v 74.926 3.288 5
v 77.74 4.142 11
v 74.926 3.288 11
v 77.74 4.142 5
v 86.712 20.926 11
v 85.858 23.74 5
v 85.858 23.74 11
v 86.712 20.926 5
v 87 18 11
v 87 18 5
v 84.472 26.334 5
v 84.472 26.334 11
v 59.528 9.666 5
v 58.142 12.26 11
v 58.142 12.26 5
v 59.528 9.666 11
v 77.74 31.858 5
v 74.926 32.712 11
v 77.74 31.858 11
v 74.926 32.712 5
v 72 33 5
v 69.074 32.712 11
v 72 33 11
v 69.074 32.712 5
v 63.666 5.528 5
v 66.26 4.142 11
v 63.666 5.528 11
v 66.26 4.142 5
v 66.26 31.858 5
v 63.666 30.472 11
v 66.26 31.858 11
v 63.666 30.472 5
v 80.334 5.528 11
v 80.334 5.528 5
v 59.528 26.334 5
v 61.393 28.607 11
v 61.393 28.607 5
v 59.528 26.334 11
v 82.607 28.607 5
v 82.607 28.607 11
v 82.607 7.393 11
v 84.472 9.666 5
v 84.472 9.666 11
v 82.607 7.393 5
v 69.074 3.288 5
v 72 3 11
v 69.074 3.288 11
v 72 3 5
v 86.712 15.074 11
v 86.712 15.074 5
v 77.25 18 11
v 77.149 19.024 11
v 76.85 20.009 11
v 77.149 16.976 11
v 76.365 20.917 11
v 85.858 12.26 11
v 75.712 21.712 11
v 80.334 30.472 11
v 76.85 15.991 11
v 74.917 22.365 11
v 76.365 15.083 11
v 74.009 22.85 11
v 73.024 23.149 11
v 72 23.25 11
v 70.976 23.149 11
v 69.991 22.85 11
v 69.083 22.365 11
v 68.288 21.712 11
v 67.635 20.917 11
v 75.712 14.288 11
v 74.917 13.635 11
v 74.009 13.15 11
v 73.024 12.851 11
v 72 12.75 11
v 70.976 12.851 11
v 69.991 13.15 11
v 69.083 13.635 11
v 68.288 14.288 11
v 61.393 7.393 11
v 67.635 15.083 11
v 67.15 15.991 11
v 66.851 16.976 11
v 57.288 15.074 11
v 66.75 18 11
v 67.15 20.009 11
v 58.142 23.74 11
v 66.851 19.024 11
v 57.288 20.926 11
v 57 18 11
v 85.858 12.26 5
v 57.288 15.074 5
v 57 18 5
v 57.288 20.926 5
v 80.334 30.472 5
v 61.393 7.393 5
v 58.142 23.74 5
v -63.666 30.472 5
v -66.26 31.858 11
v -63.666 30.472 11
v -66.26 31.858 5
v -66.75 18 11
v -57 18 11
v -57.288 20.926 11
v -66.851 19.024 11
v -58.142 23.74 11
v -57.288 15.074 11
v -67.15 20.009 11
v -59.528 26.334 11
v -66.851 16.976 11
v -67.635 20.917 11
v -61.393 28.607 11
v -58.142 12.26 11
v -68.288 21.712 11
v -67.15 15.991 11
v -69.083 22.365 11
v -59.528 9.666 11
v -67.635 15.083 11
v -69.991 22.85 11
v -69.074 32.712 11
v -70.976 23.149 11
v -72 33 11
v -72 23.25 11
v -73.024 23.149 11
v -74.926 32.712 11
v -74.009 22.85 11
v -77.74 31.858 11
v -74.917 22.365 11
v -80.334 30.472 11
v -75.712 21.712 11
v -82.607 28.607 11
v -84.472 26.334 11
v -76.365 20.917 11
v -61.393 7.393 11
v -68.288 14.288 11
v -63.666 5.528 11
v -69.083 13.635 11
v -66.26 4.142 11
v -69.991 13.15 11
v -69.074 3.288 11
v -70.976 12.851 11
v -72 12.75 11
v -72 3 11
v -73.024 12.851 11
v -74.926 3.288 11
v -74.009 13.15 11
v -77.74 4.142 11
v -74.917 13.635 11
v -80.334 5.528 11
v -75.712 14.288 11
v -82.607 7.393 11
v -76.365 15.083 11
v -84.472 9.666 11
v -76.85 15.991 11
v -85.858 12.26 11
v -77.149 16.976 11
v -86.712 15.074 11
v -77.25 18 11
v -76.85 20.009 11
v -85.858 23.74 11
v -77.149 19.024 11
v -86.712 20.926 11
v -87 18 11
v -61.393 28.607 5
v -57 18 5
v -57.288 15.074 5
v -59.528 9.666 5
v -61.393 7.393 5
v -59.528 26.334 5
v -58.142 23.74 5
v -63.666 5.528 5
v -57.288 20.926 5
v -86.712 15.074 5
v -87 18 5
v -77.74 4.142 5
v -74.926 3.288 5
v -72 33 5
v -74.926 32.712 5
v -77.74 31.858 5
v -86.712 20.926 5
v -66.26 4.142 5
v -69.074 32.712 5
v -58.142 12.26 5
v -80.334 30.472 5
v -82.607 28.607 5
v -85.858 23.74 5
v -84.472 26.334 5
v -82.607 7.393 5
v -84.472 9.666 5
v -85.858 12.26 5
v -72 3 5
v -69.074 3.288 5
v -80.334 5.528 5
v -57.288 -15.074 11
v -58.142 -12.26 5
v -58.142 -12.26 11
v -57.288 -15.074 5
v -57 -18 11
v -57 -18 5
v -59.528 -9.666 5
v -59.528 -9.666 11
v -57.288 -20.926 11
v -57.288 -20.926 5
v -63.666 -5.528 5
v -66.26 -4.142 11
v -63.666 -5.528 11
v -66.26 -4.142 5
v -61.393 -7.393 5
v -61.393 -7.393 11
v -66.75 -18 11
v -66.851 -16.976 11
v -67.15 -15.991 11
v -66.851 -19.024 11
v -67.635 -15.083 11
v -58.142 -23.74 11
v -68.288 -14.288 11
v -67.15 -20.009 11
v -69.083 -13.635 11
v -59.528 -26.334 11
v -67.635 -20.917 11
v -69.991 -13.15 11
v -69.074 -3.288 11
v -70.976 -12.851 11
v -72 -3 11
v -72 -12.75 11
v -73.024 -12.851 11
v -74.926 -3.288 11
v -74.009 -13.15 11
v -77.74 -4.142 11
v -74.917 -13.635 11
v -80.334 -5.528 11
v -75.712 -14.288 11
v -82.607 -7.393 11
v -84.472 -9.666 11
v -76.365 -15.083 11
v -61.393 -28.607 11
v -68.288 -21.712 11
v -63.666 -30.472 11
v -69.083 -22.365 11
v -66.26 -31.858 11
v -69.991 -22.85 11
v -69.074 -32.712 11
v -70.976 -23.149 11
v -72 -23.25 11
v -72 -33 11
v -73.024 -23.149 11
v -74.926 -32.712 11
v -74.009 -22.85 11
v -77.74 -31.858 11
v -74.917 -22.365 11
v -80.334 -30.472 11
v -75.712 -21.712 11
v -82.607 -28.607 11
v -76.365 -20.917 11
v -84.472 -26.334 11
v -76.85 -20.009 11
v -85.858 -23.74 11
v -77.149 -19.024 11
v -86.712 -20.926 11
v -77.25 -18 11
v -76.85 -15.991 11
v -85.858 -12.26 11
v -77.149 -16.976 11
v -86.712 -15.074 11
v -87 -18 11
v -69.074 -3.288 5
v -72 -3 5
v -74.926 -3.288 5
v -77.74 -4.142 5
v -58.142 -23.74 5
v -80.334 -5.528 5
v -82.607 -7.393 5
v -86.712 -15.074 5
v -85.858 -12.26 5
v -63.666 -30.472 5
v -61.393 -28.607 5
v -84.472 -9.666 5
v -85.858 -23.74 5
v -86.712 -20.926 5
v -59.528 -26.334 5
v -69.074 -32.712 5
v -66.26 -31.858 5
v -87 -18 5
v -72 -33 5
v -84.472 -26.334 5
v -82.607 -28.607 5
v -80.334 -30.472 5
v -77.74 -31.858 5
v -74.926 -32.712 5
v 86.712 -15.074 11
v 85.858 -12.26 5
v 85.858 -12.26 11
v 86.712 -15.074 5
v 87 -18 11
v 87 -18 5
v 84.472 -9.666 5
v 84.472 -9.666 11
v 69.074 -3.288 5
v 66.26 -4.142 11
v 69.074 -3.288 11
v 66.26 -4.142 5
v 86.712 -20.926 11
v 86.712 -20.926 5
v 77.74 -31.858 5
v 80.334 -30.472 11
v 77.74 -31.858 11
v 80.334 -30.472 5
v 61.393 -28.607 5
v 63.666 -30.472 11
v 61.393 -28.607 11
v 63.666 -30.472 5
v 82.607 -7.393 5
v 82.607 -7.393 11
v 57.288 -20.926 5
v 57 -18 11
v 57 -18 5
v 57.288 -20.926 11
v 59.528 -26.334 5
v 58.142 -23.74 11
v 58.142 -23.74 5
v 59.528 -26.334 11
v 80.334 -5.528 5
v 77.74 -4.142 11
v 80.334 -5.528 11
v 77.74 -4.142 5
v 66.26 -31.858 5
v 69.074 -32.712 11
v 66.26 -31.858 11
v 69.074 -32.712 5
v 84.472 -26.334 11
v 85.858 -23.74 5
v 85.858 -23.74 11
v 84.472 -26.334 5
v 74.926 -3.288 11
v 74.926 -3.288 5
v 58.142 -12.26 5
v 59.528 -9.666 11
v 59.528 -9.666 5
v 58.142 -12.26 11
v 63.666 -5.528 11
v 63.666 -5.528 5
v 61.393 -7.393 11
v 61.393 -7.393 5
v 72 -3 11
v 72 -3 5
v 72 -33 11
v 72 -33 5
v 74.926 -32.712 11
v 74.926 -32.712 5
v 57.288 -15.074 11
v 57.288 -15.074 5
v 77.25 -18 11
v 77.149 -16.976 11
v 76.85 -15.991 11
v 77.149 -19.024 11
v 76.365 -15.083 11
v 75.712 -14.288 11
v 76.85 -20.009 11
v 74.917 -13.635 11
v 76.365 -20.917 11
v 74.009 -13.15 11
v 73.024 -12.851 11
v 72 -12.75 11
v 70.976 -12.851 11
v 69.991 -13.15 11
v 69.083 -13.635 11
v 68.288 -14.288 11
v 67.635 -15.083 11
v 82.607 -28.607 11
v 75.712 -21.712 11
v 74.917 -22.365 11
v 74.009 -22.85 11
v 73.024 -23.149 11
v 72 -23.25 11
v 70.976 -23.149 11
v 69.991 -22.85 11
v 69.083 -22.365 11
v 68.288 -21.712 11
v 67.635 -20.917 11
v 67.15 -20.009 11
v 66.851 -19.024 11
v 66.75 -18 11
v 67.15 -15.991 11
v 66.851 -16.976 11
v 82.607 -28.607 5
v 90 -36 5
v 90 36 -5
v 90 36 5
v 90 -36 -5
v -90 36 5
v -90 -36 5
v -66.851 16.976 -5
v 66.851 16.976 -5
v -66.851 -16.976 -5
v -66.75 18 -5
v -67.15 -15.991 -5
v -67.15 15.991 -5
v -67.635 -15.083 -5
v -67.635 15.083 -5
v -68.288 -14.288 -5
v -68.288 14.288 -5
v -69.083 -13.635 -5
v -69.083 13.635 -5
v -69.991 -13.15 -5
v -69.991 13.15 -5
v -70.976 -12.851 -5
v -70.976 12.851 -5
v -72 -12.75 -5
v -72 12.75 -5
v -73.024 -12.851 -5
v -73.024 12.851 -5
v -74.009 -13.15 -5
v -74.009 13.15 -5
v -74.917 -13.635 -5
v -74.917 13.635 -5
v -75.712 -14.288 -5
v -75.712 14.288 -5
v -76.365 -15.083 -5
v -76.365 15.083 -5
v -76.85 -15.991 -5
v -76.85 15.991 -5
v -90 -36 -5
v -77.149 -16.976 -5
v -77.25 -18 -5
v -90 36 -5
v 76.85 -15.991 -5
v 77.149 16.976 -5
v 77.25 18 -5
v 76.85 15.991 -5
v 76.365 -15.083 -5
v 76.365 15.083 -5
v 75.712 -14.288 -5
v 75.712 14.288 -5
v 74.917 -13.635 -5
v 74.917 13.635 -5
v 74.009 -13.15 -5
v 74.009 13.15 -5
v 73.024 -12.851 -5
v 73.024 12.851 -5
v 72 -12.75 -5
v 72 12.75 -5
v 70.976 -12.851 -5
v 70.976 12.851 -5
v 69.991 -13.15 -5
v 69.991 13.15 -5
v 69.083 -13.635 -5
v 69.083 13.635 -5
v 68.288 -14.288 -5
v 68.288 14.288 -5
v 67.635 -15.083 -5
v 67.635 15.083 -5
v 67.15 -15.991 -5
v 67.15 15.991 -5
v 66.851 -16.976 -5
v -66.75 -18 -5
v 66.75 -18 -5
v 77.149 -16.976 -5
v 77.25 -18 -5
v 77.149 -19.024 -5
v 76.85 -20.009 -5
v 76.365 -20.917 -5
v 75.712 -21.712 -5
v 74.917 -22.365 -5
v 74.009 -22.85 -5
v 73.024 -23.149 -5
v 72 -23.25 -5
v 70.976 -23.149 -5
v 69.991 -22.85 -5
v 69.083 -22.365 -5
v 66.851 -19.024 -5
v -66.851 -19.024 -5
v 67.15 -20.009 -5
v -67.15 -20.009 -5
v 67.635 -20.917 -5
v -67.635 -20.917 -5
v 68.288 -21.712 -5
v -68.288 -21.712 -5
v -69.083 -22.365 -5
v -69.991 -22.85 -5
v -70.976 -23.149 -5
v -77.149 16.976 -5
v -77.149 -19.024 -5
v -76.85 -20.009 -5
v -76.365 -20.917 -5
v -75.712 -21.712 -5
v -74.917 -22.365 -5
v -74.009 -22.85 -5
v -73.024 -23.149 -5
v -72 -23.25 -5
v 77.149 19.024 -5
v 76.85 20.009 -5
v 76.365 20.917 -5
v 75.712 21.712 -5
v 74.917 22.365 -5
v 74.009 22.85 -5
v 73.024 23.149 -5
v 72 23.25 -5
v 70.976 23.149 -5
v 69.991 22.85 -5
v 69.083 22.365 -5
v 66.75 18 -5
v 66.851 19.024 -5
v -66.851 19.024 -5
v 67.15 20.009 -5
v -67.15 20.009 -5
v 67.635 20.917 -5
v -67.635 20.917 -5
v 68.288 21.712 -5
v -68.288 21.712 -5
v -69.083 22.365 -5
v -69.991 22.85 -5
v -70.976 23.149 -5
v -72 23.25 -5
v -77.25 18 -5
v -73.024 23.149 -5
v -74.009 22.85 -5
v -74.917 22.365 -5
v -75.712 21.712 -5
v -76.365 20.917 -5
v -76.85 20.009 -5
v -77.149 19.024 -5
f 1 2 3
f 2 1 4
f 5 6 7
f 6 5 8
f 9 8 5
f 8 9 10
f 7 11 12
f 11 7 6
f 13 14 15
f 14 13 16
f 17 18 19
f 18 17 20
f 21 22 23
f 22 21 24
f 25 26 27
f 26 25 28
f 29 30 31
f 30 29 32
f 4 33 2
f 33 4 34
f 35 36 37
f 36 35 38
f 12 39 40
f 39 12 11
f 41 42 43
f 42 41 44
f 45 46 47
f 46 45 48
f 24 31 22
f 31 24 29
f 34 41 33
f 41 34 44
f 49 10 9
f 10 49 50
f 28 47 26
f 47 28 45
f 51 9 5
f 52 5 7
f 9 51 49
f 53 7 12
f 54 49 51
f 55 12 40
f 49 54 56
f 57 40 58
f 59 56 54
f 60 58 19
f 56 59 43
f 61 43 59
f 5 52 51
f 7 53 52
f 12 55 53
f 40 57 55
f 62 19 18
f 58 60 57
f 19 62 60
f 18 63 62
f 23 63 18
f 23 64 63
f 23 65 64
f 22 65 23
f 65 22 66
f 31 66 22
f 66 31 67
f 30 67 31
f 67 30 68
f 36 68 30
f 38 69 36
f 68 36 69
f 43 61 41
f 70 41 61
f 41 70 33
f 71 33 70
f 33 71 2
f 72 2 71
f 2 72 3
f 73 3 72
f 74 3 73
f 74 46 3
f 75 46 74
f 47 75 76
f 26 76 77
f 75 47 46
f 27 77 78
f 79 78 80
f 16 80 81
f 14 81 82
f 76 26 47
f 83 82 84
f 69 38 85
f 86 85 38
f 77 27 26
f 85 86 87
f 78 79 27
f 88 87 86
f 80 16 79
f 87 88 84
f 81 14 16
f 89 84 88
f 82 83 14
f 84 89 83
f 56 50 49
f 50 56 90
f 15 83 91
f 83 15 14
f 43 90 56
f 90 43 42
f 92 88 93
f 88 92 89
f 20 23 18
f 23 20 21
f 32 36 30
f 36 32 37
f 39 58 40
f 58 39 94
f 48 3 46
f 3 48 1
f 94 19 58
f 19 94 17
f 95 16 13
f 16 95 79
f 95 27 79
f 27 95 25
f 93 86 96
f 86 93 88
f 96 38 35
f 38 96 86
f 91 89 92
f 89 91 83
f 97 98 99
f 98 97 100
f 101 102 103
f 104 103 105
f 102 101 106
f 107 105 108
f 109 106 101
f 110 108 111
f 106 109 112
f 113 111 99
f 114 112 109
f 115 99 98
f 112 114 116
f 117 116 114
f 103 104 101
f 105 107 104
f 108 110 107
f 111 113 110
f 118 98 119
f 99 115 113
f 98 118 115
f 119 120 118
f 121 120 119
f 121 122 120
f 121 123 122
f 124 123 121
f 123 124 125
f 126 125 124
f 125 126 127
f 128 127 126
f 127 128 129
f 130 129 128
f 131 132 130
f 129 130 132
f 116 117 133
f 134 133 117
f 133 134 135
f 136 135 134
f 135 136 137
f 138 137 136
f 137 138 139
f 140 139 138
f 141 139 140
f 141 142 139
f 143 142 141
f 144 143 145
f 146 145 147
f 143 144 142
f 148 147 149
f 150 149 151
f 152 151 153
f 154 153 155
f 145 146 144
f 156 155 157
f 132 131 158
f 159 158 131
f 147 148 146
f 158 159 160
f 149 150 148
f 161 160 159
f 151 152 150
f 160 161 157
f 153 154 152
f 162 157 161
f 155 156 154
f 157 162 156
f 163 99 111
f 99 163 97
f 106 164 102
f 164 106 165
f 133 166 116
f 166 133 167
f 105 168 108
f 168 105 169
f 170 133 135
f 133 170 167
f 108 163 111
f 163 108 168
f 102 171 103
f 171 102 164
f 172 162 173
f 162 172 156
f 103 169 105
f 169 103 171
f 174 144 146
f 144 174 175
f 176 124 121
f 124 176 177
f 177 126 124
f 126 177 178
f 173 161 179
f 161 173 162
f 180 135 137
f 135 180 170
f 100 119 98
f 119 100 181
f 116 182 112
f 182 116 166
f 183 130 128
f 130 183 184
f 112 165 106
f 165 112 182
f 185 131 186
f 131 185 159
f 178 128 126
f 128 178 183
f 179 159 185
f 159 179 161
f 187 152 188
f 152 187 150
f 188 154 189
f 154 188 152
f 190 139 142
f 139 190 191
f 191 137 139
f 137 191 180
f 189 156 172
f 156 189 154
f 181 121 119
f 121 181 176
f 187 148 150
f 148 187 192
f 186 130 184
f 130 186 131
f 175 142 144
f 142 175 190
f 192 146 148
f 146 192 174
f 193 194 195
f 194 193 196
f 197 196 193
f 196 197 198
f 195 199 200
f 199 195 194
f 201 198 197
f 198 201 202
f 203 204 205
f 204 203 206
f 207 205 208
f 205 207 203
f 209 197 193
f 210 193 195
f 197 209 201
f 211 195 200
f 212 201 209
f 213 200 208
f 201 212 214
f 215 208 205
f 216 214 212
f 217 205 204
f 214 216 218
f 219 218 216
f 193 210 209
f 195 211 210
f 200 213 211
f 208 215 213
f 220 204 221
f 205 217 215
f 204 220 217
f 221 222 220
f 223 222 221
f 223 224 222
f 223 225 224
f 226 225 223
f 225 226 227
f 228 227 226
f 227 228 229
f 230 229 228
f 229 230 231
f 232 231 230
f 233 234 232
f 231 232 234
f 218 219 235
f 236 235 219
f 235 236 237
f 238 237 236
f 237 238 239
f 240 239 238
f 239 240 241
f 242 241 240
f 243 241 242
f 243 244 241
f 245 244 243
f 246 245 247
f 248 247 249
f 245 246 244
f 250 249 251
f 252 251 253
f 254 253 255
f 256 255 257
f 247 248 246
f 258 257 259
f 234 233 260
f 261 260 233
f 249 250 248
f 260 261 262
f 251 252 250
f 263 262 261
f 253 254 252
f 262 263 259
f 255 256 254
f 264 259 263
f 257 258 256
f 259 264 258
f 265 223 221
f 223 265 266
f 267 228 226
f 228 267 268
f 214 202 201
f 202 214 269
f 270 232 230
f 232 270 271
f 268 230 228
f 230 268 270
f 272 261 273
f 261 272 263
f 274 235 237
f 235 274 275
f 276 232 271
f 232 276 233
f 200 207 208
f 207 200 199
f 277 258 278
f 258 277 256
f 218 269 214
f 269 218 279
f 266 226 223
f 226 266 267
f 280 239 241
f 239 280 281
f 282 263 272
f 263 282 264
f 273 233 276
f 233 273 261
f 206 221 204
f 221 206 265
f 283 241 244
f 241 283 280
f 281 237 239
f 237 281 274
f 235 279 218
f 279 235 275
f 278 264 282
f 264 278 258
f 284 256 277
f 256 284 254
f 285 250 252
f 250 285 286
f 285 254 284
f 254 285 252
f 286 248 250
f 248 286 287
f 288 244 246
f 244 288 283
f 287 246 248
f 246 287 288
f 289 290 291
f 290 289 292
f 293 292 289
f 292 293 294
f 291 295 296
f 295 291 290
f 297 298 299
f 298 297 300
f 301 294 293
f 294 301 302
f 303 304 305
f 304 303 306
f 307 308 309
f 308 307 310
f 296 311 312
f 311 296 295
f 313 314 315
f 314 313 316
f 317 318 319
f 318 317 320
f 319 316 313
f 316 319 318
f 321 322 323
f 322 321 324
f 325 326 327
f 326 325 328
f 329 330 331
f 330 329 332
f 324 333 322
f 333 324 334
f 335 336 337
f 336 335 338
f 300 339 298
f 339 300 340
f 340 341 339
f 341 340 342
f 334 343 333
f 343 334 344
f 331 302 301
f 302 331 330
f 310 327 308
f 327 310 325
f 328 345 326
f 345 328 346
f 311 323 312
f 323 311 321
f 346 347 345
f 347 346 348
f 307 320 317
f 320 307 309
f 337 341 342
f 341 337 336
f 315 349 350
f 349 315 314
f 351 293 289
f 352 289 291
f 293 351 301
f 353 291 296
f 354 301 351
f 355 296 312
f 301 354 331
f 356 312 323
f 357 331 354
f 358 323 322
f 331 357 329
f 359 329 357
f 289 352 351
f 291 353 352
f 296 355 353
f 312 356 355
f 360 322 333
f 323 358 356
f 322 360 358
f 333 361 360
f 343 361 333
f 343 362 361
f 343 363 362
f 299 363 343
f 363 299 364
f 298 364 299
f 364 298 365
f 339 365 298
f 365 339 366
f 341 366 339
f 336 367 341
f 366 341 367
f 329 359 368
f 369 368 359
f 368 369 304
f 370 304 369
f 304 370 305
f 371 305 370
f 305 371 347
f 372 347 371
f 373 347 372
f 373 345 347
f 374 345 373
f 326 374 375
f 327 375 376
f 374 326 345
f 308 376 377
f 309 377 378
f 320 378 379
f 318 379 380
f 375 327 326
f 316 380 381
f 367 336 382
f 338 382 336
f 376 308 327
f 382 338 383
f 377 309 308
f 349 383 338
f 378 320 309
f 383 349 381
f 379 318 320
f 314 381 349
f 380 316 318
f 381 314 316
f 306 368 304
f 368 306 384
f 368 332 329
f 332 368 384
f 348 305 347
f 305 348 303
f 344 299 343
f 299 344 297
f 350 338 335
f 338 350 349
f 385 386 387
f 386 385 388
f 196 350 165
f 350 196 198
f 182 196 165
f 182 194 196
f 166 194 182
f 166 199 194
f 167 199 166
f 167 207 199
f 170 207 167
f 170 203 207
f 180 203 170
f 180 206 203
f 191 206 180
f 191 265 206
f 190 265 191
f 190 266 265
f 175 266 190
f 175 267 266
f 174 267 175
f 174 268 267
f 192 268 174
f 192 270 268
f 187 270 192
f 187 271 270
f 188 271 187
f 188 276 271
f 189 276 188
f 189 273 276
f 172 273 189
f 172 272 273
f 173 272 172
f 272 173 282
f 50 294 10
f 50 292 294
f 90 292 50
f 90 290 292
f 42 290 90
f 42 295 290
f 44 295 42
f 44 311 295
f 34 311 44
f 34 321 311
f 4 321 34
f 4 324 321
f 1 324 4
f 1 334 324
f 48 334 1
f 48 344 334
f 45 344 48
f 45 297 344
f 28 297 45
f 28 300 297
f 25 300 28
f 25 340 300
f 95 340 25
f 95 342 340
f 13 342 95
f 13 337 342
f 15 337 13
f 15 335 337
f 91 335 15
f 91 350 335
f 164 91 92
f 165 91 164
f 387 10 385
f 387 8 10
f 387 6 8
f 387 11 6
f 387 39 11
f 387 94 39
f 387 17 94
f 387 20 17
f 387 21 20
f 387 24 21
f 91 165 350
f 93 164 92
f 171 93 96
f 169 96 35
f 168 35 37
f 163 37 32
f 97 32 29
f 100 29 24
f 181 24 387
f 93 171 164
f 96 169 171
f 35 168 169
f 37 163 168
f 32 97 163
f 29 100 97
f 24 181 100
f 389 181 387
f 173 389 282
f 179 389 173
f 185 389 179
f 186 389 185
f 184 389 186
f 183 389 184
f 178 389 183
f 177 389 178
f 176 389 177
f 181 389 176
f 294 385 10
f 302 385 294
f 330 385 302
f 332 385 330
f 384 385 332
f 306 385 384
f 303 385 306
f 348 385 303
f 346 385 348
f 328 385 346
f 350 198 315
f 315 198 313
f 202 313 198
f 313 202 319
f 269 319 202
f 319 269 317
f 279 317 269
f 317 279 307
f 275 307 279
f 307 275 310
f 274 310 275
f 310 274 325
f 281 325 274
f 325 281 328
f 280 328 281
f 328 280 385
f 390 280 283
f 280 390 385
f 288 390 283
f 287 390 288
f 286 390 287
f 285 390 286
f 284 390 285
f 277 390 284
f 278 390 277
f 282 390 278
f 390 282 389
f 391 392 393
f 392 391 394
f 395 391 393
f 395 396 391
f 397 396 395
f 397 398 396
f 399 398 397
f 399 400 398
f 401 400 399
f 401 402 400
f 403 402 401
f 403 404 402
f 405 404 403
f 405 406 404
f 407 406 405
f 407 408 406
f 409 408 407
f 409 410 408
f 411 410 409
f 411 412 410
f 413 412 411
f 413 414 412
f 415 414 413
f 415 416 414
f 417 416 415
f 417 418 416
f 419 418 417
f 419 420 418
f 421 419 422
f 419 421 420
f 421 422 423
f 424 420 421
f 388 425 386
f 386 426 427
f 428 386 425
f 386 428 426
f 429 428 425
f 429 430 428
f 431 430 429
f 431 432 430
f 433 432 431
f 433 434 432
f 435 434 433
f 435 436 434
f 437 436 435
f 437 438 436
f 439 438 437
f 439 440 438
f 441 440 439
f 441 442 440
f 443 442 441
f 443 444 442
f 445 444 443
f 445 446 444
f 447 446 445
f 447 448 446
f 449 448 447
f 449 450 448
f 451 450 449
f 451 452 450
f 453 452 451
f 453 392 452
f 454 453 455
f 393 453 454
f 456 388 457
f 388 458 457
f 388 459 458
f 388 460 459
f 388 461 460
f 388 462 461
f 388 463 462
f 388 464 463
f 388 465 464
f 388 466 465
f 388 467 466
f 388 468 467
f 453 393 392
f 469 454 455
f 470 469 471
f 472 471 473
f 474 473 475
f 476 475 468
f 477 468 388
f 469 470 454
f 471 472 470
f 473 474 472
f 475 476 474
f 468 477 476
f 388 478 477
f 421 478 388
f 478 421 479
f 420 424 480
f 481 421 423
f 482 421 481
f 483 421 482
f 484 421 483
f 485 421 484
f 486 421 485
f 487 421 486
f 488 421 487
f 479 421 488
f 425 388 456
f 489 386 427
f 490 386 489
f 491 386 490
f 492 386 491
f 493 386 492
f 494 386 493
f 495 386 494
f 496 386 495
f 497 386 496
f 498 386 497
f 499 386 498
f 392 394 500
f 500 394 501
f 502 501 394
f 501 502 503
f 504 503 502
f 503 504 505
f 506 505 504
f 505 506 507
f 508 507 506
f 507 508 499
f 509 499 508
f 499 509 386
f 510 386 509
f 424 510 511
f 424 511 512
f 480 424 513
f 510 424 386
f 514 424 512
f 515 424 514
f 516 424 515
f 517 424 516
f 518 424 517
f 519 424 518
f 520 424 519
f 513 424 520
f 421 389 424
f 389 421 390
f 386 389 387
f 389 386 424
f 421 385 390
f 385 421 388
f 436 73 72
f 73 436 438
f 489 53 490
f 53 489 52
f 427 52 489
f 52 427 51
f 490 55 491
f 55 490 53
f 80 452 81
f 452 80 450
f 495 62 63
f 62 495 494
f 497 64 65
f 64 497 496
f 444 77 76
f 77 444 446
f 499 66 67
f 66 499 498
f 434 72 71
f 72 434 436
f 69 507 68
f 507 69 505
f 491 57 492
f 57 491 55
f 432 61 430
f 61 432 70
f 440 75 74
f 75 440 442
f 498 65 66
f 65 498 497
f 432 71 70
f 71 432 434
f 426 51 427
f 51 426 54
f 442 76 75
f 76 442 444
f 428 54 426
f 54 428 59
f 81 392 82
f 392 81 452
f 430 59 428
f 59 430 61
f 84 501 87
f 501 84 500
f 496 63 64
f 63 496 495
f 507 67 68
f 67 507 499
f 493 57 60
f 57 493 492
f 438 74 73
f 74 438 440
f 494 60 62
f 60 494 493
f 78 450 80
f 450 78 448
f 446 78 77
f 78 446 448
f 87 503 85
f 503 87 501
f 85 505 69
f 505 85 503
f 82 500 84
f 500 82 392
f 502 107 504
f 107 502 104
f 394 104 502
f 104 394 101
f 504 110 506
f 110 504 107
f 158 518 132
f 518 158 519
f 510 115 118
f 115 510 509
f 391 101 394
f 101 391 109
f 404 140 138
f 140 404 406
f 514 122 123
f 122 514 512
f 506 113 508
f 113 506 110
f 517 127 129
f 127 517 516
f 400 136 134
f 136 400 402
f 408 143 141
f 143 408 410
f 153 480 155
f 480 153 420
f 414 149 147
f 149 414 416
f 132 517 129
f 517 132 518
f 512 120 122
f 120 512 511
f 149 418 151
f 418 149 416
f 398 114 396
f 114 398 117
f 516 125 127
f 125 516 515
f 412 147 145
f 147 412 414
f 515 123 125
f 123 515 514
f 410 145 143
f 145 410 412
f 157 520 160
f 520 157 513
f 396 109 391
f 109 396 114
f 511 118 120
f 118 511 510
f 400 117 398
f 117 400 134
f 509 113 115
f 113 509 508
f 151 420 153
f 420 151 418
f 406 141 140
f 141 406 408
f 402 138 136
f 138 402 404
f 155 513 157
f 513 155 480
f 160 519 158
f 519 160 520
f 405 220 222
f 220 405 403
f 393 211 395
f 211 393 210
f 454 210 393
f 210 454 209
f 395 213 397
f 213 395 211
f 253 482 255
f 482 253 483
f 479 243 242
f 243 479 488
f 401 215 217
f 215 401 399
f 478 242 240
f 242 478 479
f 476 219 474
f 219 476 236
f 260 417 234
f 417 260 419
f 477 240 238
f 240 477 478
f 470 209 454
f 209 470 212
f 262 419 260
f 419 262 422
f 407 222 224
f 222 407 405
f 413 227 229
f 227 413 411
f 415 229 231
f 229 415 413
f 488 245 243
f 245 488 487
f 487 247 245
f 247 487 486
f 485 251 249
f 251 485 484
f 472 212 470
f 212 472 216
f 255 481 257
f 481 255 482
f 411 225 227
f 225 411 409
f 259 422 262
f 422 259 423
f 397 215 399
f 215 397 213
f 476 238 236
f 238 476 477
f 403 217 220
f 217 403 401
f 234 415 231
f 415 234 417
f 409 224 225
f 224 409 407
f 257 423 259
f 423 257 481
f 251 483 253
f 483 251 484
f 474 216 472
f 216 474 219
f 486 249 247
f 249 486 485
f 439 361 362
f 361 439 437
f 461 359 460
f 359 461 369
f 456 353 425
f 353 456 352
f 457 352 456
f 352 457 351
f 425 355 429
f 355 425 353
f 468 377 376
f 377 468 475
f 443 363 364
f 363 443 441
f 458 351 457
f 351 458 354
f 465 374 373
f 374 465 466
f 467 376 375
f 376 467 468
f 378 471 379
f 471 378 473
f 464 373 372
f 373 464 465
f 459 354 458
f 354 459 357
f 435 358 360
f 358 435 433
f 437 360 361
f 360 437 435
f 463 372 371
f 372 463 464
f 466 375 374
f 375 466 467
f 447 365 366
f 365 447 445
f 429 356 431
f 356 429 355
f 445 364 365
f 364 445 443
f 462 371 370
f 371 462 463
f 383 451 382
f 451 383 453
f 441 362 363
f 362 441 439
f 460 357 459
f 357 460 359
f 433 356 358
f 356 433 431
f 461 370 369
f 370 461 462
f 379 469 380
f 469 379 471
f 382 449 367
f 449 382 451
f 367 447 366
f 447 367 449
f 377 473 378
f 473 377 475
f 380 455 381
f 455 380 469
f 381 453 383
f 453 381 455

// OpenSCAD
$fn = 32;

// ----------------------------------------------------------------------
// Anchor pads 180 x 72 x 16
// four corner bosses with anchor holes
// ----------------------------------------------------------------------

// --- parameters (mm) ---
plate = [180, 72, 10];  // base plate size (x, y, z)
pads = 4;               // boss count, one per corner
edge = 18;              // boss centre offset from the plate edge
boss_d = 30;            // boss diameter
boss_h = 6;             // boss height above the base plate
hole_d = 10.5;          // hole diameter

// --- derived feature positions (mm) ---
height = plate[2] + boss_h;      // = 16   overall height of the part
corner_x = plate[0] / 2 - edge;  // = 72   boss centre X
corner_y = plate[1] / 2 - edge;  // = 18   boss centre Y
feature_centers = [
  [corner_x, corner_y],
  [-corner_x, corner_y],
  [-corner_x, -corner_y],
  [corner_x, -corner_y]
];   // boss centres, anchor holes are drilled there

// base plate, four bosses standing on it, anchor holes all the way through
difference() {
  union() {
    cube(plate, center = true);
    for (centre = feature_centers)
      translate([centre[0], centre[1], plate[2] / 2 - 1])
        cylinder(d = boss_d, h = boss_h + 1);
  }
  for (centre = feature_centers)
    translate([centre[0], centre[1], -height])
      cylinder(d = hole_d, h = 2 * height + 2);  // through boss and plate
}
